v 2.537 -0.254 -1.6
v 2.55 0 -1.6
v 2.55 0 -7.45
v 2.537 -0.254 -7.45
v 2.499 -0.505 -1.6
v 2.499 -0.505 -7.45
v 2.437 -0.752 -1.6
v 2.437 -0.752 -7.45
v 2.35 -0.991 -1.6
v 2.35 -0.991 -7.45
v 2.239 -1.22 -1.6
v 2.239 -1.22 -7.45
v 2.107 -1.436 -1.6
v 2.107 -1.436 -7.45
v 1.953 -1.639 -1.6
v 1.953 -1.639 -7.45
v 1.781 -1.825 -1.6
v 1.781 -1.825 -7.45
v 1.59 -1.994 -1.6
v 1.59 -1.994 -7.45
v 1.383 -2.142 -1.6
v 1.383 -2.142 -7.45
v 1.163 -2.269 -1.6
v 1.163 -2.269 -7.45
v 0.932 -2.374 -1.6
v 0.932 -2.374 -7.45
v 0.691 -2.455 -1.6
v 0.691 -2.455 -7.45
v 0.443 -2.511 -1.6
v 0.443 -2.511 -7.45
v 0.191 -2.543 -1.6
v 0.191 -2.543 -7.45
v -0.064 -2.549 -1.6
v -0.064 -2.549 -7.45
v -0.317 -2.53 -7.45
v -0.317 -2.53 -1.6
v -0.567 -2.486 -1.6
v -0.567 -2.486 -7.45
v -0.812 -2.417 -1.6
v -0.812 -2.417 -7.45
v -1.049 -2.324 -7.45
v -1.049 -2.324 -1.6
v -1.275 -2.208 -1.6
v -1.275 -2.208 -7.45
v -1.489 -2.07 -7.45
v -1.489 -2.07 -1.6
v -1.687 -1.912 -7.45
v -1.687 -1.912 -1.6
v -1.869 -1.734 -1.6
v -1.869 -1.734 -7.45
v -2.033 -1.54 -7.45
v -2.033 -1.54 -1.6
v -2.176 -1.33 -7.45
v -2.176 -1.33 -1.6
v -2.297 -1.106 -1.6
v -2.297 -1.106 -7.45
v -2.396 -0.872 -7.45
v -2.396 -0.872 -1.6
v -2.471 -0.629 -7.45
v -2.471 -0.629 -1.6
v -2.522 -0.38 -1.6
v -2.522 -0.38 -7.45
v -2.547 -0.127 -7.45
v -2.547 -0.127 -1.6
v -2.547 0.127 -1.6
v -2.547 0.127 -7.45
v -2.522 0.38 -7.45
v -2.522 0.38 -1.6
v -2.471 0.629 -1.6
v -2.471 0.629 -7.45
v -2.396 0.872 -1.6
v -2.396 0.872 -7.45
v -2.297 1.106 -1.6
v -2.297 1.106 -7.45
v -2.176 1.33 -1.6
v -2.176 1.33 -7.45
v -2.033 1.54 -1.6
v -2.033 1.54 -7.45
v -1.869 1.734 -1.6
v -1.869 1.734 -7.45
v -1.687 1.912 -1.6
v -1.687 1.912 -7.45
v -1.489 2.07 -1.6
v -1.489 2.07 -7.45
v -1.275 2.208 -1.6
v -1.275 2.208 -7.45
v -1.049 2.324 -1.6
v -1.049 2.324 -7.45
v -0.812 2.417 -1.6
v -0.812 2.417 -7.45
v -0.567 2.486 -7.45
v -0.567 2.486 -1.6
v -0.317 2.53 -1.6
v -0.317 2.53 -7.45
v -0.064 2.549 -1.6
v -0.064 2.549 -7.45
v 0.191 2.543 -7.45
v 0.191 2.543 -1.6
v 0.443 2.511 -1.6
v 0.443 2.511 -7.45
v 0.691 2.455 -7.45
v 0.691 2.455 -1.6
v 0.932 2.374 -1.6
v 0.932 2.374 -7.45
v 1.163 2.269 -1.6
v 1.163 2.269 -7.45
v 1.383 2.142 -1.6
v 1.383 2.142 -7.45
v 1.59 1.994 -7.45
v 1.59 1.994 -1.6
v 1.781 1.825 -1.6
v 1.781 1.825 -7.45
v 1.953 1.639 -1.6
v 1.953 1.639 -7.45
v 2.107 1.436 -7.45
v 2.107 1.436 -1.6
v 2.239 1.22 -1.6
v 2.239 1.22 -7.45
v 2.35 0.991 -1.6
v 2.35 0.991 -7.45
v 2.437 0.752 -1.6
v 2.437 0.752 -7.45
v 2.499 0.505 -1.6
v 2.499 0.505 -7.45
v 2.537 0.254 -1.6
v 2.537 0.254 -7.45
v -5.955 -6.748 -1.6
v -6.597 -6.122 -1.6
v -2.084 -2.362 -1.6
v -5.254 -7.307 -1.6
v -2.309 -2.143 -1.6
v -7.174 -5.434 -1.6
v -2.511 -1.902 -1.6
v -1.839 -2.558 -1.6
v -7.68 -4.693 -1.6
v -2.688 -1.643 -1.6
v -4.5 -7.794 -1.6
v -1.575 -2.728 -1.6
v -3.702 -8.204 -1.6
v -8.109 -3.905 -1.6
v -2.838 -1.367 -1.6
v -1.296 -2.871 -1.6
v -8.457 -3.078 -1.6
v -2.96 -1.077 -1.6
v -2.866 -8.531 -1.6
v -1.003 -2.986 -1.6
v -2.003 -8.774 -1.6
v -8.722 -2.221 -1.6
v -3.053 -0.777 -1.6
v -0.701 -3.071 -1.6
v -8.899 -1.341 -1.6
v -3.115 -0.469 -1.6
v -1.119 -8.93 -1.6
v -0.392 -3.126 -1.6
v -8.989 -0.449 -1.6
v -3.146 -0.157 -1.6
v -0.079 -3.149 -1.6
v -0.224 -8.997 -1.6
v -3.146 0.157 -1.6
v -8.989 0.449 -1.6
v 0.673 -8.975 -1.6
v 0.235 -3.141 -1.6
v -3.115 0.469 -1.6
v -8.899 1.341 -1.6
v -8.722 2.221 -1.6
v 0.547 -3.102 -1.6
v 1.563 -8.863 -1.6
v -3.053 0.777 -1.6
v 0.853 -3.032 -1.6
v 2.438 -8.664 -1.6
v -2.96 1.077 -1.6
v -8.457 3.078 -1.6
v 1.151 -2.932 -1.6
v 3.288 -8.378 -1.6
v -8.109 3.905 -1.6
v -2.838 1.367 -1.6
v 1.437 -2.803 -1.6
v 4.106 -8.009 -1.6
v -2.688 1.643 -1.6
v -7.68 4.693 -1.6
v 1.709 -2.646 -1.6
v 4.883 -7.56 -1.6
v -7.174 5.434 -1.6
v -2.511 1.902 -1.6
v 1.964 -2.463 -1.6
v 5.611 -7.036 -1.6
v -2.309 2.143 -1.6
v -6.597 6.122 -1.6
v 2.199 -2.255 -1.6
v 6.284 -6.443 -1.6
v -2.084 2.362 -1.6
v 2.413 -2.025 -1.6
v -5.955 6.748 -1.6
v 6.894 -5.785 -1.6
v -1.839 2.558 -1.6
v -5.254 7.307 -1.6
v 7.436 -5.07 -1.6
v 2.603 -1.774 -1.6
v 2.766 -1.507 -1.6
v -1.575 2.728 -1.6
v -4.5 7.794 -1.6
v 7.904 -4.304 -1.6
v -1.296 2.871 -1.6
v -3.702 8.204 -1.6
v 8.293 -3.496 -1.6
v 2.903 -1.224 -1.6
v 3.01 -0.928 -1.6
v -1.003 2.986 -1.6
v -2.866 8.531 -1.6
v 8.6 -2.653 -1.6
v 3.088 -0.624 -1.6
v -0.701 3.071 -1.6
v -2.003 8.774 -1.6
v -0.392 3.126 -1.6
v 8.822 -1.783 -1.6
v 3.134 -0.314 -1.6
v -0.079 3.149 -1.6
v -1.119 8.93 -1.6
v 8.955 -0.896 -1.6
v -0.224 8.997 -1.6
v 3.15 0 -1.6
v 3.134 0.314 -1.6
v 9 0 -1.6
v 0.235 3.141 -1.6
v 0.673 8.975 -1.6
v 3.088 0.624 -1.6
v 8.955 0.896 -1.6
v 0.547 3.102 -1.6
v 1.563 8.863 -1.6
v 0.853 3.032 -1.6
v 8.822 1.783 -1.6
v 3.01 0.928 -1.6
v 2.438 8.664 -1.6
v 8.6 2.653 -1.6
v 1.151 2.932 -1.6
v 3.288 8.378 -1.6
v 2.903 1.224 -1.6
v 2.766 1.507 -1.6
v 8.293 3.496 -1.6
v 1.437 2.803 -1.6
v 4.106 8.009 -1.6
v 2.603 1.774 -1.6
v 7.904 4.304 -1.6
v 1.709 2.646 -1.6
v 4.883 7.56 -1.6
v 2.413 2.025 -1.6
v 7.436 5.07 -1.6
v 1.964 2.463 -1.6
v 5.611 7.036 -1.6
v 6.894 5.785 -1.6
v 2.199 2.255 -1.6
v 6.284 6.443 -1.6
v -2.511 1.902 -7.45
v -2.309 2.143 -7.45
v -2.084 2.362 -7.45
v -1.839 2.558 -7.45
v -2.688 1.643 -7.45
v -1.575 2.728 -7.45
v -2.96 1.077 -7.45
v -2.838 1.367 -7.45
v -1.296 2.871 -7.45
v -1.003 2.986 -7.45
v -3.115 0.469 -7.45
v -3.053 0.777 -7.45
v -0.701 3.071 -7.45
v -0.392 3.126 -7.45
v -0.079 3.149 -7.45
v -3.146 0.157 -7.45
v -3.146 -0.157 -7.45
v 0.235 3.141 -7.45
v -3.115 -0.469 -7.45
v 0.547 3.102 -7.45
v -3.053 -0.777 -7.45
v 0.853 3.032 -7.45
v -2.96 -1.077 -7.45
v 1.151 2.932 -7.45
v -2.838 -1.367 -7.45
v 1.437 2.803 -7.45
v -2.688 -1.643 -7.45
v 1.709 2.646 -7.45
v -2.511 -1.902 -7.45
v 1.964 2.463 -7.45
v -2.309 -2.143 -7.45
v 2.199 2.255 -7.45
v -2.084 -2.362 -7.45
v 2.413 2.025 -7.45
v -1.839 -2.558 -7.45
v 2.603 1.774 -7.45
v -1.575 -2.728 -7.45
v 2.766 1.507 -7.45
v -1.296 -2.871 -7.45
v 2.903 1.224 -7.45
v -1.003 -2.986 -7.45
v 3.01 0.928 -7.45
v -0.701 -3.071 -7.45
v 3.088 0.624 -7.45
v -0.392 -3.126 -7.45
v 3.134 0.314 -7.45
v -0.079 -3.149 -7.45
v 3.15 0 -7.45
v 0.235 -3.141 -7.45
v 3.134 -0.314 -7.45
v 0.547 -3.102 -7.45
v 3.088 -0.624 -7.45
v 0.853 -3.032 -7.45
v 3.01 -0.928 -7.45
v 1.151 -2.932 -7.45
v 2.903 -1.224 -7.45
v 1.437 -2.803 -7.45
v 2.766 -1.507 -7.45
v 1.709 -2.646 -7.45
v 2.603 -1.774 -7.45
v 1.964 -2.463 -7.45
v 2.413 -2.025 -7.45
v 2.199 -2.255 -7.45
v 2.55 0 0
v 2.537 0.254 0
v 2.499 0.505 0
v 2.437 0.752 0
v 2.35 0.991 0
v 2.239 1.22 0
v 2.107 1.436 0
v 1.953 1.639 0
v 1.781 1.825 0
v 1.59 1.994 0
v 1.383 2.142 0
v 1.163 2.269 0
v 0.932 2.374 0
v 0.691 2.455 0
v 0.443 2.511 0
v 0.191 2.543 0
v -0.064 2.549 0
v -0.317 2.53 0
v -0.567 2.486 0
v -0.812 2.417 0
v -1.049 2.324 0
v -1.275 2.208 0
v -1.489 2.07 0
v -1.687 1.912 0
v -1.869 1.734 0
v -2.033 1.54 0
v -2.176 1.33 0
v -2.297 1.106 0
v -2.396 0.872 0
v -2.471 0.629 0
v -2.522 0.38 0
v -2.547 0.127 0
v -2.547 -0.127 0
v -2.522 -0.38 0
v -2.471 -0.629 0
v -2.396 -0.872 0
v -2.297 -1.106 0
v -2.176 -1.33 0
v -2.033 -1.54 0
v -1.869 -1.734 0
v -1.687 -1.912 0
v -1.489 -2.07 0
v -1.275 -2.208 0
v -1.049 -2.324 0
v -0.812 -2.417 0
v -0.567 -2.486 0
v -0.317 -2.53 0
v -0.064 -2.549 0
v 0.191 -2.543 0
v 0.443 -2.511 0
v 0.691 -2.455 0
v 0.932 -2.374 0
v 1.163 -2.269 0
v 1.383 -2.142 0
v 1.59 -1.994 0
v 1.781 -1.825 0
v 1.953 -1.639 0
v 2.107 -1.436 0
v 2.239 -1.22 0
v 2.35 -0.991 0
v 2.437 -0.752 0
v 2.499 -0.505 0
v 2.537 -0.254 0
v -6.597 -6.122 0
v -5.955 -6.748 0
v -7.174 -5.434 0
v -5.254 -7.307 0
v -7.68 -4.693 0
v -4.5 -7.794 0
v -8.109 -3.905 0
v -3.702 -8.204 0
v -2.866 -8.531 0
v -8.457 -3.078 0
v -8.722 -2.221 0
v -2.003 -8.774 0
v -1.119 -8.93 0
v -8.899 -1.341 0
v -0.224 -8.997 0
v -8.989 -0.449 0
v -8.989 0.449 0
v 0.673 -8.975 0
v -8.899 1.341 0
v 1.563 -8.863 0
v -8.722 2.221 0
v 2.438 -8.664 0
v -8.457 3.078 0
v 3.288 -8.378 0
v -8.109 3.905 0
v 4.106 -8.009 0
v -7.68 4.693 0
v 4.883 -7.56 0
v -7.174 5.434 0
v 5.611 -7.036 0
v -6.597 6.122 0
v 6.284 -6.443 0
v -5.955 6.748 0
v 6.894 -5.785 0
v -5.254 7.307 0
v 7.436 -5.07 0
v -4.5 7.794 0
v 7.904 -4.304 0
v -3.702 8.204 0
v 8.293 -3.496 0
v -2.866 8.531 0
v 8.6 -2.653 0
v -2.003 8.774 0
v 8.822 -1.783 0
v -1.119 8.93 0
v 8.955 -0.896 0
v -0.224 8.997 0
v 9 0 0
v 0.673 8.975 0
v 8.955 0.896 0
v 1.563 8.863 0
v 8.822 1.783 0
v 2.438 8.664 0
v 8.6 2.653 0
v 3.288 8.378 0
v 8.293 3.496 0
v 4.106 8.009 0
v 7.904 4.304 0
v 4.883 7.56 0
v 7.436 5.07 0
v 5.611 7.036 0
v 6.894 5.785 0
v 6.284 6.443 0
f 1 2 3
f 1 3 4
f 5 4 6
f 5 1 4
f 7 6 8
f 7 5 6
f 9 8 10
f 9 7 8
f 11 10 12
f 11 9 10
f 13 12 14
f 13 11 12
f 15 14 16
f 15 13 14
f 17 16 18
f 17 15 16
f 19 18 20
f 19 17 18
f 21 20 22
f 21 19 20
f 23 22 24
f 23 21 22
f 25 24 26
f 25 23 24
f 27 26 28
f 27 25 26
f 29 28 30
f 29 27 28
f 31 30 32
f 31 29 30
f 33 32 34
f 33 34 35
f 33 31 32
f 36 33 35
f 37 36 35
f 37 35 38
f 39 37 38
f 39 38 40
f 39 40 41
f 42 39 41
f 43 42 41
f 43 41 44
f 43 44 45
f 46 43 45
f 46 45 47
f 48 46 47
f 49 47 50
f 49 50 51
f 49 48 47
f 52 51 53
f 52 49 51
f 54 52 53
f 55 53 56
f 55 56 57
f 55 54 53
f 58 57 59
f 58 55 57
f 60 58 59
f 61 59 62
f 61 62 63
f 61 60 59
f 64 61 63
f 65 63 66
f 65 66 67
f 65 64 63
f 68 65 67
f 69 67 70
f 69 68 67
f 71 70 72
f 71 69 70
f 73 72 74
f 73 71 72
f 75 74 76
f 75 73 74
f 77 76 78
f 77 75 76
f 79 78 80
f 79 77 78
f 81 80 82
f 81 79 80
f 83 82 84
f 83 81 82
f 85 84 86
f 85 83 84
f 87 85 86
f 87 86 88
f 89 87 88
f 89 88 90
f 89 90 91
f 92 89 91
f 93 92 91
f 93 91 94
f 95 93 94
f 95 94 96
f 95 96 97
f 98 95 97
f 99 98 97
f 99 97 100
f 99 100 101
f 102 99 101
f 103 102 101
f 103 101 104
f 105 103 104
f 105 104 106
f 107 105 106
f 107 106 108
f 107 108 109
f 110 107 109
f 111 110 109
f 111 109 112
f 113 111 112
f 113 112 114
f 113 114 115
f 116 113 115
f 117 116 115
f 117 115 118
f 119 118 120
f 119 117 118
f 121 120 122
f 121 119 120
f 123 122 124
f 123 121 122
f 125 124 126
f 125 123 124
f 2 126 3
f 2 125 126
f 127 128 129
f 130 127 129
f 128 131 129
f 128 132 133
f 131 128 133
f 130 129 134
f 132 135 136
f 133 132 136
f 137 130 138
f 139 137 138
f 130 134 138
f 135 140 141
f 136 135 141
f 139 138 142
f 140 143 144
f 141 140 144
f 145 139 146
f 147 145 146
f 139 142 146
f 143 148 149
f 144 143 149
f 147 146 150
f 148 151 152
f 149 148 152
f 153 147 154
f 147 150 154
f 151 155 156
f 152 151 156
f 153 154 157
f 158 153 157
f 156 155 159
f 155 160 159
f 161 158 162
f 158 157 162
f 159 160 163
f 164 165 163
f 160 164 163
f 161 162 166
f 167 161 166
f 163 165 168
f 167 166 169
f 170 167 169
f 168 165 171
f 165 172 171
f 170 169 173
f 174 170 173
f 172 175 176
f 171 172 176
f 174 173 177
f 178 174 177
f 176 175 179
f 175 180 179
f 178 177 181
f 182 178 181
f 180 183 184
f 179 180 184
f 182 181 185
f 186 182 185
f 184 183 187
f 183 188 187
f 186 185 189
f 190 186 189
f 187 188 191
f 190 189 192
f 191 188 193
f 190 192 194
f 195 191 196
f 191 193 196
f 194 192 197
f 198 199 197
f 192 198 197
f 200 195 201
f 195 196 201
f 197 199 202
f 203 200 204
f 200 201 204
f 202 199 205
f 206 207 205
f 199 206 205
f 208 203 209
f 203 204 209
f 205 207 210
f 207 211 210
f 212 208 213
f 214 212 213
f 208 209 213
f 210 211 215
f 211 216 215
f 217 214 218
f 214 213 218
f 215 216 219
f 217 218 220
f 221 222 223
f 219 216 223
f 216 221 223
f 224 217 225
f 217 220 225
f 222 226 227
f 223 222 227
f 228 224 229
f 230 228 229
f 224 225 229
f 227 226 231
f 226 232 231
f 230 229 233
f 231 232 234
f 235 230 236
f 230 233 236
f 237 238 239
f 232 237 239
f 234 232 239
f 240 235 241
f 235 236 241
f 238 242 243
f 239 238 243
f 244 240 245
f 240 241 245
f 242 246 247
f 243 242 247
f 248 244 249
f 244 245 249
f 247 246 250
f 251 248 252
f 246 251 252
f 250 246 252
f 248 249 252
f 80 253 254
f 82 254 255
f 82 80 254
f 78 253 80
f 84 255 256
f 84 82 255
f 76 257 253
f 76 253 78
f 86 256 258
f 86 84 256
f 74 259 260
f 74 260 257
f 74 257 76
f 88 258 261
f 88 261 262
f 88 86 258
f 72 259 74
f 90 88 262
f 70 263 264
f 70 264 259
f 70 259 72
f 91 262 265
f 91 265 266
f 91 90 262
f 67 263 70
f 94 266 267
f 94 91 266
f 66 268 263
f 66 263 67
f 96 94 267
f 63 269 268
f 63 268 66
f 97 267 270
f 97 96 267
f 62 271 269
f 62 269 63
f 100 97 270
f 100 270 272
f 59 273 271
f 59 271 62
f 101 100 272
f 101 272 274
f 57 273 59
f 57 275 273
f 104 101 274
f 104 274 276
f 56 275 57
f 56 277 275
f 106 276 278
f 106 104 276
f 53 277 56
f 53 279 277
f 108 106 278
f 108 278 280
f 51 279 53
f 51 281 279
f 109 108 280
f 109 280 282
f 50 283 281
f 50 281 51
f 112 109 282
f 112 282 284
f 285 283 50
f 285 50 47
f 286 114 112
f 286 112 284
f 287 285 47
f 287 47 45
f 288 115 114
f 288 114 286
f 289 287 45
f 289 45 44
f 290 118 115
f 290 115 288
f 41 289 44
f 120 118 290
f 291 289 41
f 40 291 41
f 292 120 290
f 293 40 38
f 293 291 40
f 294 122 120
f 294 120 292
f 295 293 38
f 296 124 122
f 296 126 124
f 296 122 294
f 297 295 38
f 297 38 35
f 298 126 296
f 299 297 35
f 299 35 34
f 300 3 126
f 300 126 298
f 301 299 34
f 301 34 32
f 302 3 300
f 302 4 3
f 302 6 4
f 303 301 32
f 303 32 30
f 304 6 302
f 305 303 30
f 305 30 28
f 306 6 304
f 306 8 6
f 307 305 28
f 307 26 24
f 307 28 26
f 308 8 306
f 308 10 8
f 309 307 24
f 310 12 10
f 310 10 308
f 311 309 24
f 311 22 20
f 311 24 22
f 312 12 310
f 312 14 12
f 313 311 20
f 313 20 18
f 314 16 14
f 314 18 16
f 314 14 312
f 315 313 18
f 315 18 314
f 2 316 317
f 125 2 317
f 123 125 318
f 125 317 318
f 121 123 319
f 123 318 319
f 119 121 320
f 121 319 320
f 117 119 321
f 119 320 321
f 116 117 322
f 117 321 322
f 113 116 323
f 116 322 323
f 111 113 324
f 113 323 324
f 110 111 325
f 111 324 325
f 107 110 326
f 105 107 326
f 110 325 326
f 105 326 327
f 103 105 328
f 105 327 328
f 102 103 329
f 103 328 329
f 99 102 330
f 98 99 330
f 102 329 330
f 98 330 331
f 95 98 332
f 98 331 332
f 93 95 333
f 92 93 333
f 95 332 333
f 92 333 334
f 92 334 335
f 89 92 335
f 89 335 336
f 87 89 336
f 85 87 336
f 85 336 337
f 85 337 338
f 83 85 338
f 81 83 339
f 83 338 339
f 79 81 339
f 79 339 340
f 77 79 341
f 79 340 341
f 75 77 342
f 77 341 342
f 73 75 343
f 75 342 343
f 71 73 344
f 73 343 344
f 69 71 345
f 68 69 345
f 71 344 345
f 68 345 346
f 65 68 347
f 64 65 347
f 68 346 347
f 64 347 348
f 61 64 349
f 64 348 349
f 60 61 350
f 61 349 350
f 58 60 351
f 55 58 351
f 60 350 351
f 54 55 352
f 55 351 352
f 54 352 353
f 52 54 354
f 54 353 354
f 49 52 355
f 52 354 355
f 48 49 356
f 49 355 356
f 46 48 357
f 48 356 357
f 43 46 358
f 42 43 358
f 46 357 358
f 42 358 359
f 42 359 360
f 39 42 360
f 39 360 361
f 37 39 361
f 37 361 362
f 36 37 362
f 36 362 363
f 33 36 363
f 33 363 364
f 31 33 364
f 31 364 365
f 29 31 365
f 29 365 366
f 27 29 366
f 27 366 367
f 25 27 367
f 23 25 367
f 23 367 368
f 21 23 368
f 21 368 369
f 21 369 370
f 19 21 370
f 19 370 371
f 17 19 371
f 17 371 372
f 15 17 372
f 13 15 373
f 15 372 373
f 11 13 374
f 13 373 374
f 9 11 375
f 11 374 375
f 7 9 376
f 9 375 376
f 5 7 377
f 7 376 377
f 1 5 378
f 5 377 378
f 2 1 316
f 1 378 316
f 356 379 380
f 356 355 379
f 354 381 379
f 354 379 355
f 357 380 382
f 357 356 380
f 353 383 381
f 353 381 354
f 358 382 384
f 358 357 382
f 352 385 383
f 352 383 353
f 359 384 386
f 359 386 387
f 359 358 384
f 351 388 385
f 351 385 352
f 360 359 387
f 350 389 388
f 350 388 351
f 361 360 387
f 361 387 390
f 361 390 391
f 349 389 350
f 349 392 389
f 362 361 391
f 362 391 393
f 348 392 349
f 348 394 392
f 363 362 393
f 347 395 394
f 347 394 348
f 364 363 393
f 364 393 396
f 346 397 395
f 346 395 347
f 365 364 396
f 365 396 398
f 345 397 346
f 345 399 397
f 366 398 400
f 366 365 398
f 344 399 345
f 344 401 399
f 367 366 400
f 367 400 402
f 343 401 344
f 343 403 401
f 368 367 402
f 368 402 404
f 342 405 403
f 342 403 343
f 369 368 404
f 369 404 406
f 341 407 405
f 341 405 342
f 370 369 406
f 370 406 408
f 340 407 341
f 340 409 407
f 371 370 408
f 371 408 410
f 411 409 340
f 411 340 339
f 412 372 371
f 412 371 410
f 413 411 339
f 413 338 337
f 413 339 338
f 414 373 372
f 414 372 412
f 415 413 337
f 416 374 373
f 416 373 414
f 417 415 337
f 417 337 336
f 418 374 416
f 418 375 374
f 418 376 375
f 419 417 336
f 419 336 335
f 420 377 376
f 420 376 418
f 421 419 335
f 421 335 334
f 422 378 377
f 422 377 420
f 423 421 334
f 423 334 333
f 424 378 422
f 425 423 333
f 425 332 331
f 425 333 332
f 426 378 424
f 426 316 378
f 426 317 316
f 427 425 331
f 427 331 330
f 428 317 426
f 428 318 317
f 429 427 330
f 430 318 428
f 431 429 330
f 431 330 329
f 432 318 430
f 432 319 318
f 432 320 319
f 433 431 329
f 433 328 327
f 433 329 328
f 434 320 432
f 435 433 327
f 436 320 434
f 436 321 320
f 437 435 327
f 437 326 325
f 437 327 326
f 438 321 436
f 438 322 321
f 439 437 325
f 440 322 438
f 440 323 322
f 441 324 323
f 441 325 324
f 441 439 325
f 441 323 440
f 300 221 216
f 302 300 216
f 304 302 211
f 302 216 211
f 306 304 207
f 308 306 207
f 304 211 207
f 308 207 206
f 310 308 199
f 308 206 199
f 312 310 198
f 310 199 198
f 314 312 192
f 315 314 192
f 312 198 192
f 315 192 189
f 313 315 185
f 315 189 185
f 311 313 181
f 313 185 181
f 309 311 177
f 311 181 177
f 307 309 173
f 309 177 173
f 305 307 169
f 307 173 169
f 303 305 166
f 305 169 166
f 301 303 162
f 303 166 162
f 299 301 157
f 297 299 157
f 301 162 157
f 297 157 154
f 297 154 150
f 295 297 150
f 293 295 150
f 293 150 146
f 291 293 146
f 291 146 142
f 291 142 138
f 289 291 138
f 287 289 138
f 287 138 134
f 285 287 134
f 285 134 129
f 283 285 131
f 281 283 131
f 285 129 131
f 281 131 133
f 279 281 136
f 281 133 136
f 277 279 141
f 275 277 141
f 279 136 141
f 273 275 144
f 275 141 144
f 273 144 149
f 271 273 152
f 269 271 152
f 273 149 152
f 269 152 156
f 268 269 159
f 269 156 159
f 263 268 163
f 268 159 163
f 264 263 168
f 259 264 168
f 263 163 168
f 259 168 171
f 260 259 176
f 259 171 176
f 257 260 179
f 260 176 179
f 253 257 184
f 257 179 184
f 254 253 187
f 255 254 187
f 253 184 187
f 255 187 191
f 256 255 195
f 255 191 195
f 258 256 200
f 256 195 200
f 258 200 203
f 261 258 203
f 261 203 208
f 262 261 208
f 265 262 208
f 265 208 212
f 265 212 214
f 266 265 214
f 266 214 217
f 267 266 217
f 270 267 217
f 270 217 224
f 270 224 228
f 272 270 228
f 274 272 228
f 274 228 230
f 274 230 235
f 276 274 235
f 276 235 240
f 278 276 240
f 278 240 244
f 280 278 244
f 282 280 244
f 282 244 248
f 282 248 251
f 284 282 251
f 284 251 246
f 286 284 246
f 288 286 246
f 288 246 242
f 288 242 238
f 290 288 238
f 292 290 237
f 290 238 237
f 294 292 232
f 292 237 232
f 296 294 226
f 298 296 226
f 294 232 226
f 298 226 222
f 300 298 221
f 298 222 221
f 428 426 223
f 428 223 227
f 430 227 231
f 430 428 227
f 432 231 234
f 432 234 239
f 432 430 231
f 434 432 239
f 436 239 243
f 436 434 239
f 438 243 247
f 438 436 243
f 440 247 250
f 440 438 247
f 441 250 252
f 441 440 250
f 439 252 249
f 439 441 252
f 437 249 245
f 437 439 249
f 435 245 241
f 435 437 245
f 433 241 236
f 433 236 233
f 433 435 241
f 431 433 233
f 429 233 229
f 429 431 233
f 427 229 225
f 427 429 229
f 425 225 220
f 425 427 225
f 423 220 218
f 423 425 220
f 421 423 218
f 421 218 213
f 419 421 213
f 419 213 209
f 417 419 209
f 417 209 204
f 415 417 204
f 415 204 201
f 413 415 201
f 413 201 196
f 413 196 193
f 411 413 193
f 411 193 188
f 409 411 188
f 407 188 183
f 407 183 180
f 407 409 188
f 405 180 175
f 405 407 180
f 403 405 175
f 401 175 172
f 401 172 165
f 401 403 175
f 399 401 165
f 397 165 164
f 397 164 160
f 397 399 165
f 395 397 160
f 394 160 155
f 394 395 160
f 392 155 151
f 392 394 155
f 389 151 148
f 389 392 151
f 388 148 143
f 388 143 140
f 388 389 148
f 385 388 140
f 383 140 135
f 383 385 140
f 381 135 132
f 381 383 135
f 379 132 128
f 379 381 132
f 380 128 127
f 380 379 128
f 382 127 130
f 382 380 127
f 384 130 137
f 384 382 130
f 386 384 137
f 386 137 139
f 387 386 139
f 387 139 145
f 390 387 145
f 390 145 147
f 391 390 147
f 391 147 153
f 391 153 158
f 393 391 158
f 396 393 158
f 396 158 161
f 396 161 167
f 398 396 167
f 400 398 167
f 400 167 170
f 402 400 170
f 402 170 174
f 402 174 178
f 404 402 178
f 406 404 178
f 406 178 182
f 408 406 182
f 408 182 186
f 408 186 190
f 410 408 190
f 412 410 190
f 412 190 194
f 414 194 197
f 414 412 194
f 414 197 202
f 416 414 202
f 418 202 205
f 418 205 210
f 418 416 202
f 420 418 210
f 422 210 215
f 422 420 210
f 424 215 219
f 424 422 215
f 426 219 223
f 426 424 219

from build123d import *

# Parameters (mm, degrees)
SKETCH_R      = 9
SKETCH_R_2    = 2.55
PAD_DEPTH     = 1.6
SKETCH001_R   = 3.15
SKETCH001_R_2 = 2.55
PAD001_DEPTH  = 5.85


with BuildPart() as part:
    # Sketch → Pad (new body)
    with BuildSketch(Plane.XY):
        Circle(SKETCH_R)
        Circle(SKETCH_R_2, mode=Mode.SUBTRACT)
    extrude(amount=-PAD_DEPTH)

    # Sketch001 → Pad001 (new body)
    with BuildSketch(Plane(origin=(0, 0, -1.6), x_dir=(1, 0, 0), z_dir=(0, 0, -1))):
        Circle(SKETCH001_R)
        Circle(SKETCH001_R_2, mode=Mode.SUBTRACT)
    extrude(amount=PAD001_DEPTH)


solid = part.part
